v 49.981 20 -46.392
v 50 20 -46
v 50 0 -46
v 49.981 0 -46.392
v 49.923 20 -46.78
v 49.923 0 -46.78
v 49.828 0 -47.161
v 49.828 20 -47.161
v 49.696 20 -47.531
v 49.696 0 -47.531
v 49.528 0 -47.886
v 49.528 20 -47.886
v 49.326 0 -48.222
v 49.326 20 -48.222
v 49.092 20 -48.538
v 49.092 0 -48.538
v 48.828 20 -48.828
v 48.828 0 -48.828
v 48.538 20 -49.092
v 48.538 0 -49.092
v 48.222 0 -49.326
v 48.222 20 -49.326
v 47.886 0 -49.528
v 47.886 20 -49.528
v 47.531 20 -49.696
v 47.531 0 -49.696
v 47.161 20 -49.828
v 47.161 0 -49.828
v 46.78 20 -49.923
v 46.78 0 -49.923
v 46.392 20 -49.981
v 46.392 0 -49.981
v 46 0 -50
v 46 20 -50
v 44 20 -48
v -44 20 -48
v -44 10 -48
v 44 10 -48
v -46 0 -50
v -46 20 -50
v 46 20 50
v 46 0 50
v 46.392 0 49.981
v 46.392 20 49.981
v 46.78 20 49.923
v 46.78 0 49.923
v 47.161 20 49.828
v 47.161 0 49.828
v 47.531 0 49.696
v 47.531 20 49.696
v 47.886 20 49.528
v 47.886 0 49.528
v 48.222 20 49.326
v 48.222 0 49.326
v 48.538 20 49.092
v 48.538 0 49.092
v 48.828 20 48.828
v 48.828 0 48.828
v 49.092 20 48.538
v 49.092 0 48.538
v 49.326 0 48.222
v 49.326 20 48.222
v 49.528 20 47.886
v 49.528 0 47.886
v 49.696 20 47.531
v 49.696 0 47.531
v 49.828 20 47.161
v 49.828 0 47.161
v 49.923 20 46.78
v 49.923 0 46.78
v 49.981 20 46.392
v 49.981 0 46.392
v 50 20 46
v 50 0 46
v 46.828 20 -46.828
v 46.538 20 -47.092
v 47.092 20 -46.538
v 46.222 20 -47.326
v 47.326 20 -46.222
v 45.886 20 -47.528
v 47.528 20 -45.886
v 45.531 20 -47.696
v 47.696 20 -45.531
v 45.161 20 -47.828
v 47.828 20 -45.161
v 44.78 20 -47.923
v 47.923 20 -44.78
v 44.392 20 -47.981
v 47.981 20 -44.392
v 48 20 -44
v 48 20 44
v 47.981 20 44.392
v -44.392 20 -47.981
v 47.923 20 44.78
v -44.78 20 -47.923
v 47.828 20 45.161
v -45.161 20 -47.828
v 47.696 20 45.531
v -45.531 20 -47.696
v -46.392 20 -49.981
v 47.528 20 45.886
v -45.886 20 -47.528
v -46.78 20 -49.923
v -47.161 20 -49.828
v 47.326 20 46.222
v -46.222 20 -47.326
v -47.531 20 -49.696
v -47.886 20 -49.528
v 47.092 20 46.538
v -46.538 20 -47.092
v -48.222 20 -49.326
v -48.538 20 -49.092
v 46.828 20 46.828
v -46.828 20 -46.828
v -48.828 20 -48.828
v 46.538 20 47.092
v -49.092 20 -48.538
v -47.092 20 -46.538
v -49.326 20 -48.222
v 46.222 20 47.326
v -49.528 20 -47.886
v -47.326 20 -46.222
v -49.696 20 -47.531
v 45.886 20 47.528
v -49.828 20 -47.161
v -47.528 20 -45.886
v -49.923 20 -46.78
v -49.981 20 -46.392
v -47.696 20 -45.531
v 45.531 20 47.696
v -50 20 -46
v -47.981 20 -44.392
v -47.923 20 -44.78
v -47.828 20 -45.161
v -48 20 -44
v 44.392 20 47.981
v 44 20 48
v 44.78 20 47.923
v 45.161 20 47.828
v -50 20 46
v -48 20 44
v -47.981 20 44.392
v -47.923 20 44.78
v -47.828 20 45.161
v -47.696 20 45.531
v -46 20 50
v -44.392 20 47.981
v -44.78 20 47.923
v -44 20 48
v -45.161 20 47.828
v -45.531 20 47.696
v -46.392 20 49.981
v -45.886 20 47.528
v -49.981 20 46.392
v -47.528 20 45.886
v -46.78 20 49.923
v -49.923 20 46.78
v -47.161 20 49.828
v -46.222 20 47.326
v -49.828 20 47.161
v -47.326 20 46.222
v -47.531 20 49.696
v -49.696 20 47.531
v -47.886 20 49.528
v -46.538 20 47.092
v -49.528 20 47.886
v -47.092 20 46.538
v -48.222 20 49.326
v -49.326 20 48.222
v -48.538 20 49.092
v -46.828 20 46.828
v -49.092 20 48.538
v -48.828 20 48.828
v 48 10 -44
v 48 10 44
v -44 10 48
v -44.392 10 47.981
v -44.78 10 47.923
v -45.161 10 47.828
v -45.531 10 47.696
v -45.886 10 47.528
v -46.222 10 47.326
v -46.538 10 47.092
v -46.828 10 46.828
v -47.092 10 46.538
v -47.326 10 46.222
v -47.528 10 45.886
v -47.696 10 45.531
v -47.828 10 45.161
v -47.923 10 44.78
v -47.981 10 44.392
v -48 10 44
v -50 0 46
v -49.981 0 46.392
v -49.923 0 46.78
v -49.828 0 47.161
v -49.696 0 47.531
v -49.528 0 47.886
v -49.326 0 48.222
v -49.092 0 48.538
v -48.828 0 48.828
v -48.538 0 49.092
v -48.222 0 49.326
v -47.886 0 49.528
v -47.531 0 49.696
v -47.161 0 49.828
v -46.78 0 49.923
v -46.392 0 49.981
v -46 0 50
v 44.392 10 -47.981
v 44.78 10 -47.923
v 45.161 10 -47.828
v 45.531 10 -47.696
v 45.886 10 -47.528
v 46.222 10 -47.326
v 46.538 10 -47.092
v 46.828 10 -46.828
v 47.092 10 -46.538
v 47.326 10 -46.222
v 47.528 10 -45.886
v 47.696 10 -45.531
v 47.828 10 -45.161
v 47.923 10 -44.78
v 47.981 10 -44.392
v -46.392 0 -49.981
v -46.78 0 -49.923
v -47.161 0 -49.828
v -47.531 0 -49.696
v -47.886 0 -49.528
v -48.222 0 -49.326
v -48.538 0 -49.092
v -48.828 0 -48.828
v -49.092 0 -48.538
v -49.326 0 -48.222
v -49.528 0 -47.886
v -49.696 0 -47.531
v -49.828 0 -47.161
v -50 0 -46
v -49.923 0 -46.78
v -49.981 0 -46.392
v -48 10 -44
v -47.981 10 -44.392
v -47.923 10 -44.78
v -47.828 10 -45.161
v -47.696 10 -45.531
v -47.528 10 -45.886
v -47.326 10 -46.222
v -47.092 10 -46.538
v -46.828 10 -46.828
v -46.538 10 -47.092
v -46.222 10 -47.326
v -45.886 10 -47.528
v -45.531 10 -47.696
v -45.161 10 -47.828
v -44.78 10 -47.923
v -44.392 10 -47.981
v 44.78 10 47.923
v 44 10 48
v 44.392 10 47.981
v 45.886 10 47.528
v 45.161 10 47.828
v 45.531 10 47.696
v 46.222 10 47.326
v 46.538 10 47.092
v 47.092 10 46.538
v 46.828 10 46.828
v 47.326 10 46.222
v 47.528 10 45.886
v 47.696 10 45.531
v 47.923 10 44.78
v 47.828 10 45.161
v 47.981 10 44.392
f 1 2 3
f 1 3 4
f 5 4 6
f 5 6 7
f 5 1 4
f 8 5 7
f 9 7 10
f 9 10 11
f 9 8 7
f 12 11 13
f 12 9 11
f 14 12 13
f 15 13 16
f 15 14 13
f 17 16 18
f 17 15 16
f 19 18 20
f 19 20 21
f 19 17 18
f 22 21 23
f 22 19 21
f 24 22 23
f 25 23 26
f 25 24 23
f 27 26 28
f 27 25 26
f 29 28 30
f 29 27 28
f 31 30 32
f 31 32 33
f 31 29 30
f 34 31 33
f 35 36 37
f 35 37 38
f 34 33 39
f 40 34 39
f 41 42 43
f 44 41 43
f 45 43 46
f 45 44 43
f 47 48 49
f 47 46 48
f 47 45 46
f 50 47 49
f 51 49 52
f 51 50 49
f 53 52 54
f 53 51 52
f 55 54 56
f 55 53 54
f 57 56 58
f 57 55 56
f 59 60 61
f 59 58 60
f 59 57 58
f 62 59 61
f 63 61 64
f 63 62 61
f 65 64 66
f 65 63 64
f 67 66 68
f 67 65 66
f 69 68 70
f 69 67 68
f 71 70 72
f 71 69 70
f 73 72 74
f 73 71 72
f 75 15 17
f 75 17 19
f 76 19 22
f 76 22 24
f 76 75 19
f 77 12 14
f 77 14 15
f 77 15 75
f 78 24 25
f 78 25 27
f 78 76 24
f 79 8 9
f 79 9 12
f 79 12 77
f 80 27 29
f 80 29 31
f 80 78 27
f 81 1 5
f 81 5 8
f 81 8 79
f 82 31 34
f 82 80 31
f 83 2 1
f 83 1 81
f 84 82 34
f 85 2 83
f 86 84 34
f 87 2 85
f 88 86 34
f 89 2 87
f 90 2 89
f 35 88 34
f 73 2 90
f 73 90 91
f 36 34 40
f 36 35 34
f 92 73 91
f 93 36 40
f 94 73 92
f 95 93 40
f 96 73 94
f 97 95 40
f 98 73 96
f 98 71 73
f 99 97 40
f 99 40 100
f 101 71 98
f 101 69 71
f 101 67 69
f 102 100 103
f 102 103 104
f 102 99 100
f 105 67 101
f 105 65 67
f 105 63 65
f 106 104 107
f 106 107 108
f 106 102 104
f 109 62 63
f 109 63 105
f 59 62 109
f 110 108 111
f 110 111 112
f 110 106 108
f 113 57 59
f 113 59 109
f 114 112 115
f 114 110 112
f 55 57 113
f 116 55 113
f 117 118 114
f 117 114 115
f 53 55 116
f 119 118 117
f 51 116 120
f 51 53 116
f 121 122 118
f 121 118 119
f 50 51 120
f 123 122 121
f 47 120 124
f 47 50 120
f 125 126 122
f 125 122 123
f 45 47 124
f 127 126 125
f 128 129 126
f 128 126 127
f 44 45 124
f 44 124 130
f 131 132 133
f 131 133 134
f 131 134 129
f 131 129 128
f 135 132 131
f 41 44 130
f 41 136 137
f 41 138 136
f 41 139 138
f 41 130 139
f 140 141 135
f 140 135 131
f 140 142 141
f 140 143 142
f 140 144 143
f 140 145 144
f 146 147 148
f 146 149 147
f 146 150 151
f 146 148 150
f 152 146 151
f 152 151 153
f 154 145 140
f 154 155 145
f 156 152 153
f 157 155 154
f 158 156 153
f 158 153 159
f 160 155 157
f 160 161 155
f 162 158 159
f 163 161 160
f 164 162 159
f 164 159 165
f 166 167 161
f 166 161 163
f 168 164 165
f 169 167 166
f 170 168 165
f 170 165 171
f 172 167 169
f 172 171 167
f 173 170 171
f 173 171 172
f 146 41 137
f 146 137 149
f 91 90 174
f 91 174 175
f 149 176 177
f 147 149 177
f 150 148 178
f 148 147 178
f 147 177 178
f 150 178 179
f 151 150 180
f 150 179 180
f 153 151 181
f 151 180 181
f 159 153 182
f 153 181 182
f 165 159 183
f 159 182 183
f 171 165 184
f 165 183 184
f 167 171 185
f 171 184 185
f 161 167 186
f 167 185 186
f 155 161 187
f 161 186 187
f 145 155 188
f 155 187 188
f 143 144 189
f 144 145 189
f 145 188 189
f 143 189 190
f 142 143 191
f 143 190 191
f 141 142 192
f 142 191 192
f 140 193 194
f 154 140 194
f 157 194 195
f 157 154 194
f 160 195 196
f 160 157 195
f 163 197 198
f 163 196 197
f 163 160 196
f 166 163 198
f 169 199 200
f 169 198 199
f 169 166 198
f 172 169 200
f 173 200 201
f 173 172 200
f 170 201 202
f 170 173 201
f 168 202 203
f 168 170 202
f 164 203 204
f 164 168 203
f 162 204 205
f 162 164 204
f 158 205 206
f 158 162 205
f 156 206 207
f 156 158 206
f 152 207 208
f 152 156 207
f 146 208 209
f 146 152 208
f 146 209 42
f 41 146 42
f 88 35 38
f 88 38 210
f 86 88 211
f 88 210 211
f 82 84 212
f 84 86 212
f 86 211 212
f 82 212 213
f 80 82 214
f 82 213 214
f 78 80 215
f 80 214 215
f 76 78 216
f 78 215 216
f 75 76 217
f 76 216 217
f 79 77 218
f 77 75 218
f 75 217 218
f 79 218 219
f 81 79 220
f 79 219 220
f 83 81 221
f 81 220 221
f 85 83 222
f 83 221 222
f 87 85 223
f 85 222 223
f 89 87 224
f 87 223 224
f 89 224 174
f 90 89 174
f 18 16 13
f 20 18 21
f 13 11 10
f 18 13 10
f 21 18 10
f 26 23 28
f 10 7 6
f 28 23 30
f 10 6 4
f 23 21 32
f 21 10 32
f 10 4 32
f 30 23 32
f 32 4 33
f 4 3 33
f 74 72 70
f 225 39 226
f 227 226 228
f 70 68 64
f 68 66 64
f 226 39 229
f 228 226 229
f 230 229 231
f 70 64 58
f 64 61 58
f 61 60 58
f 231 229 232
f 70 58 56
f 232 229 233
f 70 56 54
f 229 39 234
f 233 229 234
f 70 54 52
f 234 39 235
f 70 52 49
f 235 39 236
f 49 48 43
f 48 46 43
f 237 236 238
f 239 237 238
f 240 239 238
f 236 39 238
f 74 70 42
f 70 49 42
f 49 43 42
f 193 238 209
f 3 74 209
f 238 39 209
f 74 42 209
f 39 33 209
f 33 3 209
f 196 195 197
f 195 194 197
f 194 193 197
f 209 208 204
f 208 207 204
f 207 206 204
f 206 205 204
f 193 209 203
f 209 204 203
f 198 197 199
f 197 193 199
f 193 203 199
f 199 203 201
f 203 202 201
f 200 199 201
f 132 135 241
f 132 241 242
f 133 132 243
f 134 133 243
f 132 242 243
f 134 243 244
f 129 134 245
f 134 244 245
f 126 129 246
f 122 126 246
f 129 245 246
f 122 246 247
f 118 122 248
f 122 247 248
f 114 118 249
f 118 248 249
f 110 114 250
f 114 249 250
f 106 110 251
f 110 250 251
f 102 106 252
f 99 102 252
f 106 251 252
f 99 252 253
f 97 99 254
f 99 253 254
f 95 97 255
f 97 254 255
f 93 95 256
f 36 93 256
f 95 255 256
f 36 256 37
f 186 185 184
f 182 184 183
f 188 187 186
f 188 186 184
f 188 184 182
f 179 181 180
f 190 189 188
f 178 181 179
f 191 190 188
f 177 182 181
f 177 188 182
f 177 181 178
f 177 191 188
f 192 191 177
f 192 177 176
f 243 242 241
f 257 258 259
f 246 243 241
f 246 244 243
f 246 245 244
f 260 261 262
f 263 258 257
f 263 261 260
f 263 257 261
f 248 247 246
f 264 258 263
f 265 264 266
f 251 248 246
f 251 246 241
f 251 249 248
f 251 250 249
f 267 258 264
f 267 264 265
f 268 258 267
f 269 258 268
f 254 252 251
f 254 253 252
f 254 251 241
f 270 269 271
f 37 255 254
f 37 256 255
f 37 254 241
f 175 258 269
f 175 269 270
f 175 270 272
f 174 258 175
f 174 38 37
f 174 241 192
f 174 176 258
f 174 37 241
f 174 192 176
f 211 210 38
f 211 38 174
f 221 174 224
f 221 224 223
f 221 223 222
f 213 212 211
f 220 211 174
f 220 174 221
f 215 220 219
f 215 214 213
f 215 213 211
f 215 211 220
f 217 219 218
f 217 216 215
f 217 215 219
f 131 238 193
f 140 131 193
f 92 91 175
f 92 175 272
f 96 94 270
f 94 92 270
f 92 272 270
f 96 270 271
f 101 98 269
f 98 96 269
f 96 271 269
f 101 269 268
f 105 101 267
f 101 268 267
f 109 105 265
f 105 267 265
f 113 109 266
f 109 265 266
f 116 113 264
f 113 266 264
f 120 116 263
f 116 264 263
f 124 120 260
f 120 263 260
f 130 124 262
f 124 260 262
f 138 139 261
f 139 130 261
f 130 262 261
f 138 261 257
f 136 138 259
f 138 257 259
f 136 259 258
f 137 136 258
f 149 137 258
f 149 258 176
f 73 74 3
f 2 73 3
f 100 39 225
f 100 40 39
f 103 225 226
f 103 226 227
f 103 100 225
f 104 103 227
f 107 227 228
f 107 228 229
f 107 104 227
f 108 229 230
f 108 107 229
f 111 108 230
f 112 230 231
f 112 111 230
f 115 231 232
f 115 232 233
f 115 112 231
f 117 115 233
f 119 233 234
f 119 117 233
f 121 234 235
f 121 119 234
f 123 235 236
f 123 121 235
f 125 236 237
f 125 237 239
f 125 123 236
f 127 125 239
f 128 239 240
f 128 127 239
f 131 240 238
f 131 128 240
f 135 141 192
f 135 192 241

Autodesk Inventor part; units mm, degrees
ref_plane "YZ Plane" through (0, 0, 0) normal (1, 0, 0) x (0, 1, 0)
ref_plane "XZ Plane" through (0, 0, 0) normal (0, 1, 0) x (-1, 0, 0)
ref_plane "XY Plane" through (0, 0, 0) normal (0, 0, 1) x (1, 0, 0)
sketch "Szkic1" plane through (0, 0, 0) normal (0, 1, 0) x (-1, 0, 0)
  line L0 (-50, -50) -> (50, -50)
  line L1 (50, -50) -> (50, 50)
  line L2 (50, 50) -> (-50, 50)
  line L3 (-50, 50) -> (-50, -50)
  line L4 (-50, -50) -> (50, 50) construction
  line L5 (50, -50) -> (-50, 50) construction
  point P0 (0, 0)
  dimension "d0" = 100
  dimension "d1" = 100
extrude "Wyciągnięcie proste1" add sketch "Szkic1" along normal blind 20
sketch "Szkic2" plane through (0, 20, 0) normal (0, 1, 0) x (1, 0, 0)
  line L0 (-48, 48) -> (48, 48)
  line L1 (48, 48) -> (48, -48)
  line L2 (48, -48) -> (-48, -48)
  line L3 (-48, -48) -> (-48, 48)
  line L4 (-48, 48) -> (48, -48) construction
  line L5 (48, 48) -> (-48, -48) construction
  point P0 (0, 0)
  dimension "d4" = 96
  dimension "d5" = 96
extrude "Wyciągnięcie proste2" cut sketch "Szkic2" against normal blind 10
fillet "Zaokrąglenie1" radius 4 8 edges at (-48, 15, 48) (-50, 10, 50) (-50, 10, -50) (-48, 15, -48) (50, 10, -50) (48, 15, -48) (50, 10, 50) (48, 15, 48)
equation "\"PromieńGięcia\" = Grubość"
equation "\"SzerokośćGięciaPodcięcia\" = Grubość"
equation "\"GłębokośćGięciaPodcięcia\" = 0.5 * Grubość"
equation "\"RozmiarPodcięciaNarożnika\" = 4 * Grubość"
equation "\"MinimalnaPozostałość\" = 2 * Grubość"
equation "\"PromieńPrzejścia\" = PromieńGięcia"
equation "\"Rozmiar_promienia_Jacobiego\" = PromieńGięcia"
equation "\"Wielk_odstępu\" = Grubość"
equation "\"Grubość\" = 0.5"
